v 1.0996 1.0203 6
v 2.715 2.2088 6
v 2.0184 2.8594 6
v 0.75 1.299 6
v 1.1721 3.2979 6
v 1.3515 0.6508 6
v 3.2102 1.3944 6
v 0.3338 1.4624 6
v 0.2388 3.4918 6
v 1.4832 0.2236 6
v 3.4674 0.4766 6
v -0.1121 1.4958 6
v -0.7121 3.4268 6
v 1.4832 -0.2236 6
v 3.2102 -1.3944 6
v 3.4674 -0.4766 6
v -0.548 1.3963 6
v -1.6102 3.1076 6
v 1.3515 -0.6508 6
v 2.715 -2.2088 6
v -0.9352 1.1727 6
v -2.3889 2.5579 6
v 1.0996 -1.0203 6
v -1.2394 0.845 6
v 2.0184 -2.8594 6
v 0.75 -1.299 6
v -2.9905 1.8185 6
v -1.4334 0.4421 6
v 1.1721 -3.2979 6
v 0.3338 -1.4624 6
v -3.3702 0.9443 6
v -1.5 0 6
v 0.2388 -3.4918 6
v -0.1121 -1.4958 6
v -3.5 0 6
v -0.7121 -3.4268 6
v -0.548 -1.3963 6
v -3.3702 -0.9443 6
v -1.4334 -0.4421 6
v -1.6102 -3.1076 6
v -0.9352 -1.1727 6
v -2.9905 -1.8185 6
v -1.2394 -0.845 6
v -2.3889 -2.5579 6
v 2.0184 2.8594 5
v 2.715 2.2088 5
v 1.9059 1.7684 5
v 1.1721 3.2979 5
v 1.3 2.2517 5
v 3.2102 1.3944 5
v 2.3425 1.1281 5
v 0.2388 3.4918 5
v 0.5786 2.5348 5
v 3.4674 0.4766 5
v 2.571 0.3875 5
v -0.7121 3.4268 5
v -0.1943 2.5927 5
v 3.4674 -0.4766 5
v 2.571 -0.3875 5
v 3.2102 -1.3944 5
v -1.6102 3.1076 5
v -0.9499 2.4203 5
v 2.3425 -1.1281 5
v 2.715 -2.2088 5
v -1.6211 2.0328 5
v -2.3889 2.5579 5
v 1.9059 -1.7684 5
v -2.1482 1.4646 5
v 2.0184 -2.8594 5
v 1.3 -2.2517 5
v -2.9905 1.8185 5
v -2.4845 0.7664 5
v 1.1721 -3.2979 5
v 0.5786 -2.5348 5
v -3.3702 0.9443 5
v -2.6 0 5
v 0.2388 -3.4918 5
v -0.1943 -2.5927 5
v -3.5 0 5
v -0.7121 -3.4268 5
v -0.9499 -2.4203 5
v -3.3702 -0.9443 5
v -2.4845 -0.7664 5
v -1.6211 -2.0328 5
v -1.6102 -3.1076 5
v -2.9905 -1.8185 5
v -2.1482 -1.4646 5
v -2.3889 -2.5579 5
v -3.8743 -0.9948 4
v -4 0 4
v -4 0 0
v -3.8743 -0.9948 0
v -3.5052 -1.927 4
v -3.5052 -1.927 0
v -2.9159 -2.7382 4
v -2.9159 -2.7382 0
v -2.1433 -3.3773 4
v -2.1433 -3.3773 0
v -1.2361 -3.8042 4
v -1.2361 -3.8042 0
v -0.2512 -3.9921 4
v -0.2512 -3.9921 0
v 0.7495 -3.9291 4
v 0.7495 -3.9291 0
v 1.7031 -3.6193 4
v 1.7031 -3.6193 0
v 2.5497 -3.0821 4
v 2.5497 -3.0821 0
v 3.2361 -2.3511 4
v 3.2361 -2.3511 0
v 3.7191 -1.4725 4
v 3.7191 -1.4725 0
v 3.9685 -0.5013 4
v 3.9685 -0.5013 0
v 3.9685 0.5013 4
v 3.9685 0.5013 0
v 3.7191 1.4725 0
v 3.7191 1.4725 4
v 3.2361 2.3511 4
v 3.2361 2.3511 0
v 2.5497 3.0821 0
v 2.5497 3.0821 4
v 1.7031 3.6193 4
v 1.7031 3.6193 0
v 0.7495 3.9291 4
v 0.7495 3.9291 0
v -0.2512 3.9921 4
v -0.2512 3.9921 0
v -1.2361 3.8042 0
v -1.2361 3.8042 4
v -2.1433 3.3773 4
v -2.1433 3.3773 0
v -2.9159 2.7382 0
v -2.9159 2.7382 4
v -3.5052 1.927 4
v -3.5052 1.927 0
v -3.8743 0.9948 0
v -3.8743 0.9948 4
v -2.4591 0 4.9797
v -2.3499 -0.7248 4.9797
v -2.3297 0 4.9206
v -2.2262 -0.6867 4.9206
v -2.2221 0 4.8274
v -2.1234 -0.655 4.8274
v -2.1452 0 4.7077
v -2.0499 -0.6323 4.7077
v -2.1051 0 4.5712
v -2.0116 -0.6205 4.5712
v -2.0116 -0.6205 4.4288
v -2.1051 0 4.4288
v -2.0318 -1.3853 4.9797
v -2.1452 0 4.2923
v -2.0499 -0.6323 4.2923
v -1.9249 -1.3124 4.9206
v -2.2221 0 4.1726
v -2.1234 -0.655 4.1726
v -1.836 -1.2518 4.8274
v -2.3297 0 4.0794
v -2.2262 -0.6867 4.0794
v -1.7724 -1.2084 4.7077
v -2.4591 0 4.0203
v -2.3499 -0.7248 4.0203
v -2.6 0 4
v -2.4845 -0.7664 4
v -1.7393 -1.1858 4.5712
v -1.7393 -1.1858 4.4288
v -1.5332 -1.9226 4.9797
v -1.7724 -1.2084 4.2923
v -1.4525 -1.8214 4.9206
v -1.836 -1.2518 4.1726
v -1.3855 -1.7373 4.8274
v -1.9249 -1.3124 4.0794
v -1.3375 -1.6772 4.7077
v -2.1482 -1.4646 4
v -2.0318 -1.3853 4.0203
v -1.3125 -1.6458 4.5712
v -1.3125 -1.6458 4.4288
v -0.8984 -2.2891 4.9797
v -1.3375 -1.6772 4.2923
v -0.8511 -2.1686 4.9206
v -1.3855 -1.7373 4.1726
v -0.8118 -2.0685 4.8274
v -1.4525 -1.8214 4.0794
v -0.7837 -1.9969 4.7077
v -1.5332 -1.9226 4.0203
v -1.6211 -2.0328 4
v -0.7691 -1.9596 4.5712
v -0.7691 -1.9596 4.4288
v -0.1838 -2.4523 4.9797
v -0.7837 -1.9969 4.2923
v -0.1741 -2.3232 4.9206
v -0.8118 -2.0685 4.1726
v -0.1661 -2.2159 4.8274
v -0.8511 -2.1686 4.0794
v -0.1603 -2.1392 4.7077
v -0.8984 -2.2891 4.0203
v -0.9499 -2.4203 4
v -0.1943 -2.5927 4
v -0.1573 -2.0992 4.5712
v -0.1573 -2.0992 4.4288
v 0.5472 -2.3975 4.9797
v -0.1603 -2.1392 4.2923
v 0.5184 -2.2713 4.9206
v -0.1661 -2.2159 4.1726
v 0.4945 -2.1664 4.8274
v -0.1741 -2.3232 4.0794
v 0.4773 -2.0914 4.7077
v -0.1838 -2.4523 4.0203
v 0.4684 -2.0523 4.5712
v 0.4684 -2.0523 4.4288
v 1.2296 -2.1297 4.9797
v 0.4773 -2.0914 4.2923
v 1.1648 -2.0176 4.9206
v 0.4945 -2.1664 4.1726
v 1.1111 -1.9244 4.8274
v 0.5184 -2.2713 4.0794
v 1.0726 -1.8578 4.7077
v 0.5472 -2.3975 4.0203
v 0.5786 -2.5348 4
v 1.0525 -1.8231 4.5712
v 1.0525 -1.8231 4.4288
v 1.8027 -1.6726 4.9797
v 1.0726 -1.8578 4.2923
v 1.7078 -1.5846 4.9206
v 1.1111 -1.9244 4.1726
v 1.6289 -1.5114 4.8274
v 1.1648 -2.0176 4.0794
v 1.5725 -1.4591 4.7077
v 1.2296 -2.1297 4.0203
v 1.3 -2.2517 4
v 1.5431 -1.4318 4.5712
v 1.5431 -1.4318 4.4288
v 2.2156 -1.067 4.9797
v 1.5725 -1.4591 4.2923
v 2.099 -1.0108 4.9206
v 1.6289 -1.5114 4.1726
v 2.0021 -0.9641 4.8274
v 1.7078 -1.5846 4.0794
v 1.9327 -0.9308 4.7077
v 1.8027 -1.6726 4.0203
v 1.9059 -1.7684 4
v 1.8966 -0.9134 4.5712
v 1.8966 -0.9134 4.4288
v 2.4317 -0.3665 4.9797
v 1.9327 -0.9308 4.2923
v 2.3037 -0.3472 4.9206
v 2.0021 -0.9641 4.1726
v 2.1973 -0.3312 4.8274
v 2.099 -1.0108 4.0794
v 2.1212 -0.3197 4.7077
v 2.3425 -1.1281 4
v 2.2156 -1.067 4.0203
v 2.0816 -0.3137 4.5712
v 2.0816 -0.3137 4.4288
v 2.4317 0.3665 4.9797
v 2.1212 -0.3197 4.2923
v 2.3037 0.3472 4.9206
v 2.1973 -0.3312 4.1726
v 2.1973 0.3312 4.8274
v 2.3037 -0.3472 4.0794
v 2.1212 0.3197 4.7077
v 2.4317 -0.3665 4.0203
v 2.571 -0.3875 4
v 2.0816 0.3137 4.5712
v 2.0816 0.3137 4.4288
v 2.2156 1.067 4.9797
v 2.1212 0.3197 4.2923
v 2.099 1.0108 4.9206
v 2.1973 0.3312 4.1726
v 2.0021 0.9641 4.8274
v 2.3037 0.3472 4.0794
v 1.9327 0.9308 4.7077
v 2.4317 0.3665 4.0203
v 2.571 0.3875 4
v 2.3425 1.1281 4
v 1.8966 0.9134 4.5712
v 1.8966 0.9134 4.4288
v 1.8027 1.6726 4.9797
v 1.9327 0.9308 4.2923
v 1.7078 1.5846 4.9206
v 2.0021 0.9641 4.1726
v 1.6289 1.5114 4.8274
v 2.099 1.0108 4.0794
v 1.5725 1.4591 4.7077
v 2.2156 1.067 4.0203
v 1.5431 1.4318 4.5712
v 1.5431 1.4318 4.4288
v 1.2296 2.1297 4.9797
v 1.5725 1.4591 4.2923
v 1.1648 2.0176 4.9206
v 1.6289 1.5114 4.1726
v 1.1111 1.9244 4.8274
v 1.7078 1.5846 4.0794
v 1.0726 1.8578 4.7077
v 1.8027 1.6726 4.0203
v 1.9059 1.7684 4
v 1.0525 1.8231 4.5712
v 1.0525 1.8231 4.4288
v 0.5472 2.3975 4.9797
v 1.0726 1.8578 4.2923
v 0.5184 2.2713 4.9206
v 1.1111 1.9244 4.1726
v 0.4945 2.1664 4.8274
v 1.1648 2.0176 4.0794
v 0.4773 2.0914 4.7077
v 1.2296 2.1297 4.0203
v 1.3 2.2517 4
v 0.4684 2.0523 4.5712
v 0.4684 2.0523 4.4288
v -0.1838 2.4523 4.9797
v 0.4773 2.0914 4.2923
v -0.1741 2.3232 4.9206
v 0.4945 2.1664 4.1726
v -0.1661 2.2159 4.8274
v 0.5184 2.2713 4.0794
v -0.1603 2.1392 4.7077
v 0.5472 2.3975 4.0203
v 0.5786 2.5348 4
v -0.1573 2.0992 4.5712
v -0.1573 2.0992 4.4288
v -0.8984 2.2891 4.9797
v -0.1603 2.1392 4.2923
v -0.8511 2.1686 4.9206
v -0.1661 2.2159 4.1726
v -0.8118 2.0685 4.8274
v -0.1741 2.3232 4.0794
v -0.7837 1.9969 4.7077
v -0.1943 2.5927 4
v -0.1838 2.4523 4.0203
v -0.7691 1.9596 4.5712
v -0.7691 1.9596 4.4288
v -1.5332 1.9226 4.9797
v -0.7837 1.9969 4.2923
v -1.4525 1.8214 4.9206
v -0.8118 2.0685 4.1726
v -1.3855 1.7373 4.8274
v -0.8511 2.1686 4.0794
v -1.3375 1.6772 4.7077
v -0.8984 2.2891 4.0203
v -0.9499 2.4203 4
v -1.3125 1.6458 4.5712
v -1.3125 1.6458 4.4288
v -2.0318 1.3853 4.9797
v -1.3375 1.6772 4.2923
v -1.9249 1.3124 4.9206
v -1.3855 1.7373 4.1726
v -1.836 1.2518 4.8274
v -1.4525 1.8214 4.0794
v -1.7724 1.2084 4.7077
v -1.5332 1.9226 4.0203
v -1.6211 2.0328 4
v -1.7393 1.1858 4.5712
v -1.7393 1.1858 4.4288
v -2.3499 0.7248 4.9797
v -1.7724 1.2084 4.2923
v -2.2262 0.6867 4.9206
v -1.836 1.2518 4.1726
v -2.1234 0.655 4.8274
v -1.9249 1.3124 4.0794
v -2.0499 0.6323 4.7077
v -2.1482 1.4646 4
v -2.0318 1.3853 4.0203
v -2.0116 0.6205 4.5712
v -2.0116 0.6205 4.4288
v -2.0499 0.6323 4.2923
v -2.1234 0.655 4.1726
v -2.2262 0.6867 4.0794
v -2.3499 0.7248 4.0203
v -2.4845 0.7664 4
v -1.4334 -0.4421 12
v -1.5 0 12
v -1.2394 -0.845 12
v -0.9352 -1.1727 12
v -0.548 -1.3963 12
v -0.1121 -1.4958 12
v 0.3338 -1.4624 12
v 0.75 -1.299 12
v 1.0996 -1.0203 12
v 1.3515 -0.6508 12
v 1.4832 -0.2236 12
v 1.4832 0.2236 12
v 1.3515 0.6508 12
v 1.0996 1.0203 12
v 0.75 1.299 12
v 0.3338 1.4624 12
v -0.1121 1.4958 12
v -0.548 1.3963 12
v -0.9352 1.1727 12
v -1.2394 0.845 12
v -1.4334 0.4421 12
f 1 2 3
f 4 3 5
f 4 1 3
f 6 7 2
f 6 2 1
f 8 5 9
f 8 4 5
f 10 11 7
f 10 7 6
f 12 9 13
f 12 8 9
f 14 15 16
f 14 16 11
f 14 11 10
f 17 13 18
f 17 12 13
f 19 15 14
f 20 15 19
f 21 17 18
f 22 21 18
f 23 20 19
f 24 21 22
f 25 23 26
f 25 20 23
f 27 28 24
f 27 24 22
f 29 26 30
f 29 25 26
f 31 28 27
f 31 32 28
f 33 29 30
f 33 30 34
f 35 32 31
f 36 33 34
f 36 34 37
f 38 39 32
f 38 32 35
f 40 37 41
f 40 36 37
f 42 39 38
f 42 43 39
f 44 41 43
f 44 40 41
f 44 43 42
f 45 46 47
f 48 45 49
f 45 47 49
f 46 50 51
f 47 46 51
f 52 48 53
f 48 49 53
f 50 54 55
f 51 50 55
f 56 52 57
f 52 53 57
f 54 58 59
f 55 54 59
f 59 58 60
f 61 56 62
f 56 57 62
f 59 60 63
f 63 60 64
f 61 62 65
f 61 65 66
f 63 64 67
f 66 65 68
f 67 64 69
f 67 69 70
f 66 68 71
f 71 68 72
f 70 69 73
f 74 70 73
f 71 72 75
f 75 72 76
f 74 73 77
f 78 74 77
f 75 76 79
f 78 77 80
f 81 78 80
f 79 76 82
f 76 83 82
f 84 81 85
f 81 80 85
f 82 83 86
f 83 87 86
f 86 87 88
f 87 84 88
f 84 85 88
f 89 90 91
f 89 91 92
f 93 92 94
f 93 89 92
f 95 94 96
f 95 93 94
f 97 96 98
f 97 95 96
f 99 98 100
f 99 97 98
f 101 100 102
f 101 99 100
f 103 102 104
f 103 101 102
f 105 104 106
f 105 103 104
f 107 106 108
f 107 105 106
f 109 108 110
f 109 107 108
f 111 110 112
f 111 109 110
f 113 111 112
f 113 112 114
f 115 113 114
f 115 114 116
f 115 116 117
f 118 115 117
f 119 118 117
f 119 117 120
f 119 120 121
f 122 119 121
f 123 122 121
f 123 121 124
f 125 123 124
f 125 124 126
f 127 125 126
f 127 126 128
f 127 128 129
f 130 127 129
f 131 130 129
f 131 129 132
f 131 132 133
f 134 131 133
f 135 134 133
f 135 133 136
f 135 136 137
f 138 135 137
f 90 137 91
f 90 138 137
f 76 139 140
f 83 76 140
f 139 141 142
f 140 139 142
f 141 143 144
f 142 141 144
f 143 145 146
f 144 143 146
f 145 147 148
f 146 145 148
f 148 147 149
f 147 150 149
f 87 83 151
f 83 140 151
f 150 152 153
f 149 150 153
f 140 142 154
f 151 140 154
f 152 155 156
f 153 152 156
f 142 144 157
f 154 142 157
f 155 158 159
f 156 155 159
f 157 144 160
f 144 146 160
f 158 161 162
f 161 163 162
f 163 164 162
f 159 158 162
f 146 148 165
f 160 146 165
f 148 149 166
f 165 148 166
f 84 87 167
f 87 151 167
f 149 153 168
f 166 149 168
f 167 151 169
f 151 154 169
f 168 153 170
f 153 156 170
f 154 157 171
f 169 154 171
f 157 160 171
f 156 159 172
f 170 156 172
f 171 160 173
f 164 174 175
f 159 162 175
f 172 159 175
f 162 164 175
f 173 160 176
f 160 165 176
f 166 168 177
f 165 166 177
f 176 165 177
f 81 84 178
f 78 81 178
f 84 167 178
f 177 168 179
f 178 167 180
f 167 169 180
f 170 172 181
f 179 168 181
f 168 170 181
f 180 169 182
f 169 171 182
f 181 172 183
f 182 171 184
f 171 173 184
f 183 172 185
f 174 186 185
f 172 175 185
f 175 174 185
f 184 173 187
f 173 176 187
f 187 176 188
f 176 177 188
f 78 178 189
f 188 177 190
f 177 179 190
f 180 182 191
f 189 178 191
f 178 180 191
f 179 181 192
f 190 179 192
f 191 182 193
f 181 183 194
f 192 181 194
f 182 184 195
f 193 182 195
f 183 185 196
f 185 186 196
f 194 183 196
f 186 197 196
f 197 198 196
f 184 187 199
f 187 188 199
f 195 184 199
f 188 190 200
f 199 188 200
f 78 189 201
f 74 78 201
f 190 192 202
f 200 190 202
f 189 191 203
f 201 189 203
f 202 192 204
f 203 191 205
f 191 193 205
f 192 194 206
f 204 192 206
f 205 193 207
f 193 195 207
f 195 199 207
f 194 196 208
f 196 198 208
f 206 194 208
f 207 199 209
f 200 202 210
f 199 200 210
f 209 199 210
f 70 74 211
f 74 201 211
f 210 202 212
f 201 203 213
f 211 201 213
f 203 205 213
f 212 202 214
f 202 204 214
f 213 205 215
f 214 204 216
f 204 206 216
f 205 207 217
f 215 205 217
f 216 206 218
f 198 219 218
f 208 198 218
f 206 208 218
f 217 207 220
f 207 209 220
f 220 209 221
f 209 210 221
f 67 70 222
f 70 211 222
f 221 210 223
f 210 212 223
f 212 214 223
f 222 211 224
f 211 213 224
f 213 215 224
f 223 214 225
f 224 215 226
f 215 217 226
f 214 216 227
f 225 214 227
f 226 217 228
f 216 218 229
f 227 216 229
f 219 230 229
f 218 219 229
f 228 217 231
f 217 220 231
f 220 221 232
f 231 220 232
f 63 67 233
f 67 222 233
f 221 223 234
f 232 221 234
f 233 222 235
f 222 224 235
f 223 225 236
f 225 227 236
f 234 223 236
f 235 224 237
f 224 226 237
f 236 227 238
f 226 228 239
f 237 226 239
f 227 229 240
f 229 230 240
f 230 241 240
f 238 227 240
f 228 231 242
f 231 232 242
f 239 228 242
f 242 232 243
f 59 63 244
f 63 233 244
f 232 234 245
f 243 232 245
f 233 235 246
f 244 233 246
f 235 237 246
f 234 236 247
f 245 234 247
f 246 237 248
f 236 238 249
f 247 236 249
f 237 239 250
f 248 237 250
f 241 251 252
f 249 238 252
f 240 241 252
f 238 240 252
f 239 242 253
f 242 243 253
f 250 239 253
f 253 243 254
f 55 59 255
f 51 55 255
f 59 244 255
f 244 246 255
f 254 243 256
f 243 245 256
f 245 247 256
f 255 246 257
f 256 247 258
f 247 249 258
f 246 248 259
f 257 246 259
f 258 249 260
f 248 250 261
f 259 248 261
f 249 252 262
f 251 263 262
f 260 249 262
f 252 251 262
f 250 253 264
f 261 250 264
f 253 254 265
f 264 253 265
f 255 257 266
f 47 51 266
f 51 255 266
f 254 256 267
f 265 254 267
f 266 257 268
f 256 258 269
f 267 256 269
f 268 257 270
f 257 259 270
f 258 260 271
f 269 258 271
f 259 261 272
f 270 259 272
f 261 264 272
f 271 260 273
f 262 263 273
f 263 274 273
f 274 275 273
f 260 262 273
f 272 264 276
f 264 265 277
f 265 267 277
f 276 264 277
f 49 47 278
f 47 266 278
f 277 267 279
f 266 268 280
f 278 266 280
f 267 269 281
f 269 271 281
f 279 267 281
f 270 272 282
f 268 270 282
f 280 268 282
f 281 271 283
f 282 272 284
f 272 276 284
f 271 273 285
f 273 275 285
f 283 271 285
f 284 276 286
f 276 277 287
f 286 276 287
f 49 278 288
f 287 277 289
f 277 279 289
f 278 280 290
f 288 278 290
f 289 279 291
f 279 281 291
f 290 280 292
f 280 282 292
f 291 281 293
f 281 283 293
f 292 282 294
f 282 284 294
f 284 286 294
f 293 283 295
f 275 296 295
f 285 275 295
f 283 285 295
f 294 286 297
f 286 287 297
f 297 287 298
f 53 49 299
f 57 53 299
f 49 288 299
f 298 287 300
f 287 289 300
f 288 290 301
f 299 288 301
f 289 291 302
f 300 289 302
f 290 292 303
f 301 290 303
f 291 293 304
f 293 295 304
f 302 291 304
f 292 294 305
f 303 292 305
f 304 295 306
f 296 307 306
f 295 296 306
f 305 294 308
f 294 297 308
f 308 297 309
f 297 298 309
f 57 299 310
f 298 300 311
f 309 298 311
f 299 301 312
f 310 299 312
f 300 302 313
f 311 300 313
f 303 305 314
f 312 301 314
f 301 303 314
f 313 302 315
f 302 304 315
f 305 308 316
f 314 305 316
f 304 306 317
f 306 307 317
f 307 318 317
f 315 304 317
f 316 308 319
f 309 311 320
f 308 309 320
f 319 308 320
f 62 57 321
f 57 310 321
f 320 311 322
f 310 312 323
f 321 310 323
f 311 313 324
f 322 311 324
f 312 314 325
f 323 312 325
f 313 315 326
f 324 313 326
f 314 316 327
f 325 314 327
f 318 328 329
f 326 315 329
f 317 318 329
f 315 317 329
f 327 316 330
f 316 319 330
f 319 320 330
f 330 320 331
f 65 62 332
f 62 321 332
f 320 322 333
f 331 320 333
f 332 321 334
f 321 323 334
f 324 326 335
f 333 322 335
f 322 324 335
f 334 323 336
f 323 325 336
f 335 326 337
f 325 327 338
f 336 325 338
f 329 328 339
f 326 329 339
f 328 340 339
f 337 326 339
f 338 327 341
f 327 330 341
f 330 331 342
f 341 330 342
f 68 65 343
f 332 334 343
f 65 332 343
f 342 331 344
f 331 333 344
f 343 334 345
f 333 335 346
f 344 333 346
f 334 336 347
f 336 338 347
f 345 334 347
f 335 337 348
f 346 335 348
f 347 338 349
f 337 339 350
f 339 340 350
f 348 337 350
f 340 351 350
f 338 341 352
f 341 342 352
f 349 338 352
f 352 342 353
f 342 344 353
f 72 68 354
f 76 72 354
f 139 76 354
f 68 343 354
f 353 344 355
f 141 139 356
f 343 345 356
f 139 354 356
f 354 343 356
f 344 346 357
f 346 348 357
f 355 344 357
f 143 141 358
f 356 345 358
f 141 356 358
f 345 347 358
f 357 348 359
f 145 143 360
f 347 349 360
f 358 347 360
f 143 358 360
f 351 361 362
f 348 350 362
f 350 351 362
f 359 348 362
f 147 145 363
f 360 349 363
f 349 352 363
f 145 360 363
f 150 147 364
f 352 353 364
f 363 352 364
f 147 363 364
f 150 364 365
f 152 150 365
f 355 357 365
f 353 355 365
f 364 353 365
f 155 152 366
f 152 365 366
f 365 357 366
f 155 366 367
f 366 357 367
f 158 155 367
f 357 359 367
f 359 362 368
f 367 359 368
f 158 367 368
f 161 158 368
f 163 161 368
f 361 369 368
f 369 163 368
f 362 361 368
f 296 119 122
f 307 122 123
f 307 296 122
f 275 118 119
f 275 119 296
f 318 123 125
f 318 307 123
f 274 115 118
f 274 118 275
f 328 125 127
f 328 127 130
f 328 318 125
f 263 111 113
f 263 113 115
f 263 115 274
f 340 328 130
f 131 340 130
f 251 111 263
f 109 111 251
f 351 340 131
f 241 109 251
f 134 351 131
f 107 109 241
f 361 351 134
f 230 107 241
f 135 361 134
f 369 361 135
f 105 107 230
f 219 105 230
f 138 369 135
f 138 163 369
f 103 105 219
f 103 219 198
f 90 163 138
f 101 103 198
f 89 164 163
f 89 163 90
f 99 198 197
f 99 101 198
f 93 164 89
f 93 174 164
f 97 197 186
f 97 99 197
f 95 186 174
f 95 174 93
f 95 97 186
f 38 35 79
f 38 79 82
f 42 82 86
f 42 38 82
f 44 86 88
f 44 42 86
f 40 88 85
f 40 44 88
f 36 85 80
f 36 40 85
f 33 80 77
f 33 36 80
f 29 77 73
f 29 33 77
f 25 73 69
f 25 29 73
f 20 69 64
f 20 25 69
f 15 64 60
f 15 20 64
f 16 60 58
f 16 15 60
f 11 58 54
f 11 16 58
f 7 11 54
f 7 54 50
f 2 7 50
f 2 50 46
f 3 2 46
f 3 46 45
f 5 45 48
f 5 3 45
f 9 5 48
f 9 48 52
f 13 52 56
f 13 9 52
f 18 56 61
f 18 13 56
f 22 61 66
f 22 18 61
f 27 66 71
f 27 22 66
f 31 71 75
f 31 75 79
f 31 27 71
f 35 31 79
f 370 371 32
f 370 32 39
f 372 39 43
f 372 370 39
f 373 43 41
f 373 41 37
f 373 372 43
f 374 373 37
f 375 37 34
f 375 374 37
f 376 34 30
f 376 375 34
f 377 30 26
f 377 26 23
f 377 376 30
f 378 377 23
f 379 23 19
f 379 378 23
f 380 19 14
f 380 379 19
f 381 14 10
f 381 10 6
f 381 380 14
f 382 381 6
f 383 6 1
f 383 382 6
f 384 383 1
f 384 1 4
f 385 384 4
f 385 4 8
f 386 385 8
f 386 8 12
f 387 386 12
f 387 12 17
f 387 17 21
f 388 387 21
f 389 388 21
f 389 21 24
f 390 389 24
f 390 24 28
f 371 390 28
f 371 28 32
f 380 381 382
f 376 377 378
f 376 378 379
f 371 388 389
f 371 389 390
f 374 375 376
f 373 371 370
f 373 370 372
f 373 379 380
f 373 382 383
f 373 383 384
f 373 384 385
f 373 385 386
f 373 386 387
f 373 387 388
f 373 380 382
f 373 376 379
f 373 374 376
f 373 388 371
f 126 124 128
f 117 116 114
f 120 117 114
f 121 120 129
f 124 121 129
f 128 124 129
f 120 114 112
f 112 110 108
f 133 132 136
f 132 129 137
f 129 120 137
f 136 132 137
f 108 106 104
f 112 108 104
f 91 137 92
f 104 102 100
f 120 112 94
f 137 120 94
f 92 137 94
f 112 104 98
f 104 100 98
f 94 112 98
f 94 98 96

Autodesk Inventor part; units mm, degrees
ref_plane "YZ Plane" through (0, 0, 0) normal (1, 0, 0) x (0, 1, 0)
ref_plane "XZ Plane" through (0, 0, 0) normal (0, 1, 0) x (-1, 0, 0)
ref_plane "XY Plane" through (0, 0, 0) normal (0, 0, 1) x (1, 0, 0)
sketch "スケッチ1" plane through (0, 0, 0) normal (0, 1, 0) x (-1, 0, 0)
  line L0 (0, 0) -> (0, 12)
  line L1 (0, 0) -> (4, 0)
  line L2 (4, 0) -> (4, 4)
  line L3 (4, 4) -> (2.6, 4)
  line L4 (2.6, 4) -> (2.6, 5) construction
  line L5 (2.6, 5) -> (3.5, 5)
  line L6 (3.5, 5) -> (3.5, 6)
  line L7 (3.5, 6) -> (1.5, 6)
  line L8 (1.5, 6) -> (1.5, 12)
  line L9 (1.5, 12) -> (0, 12)
  arc A0 (2.6, 5) -> (2.6, 4) centre (2.6, 4.5) ccw
  line L10 (2.6, 4.5) -> (2.1, 4.5) construction
  dimension "d4" = 1
  dimension "d5" = 6
  dimension "d7" = 4
  dimension "d8" = 6
  dimension "d11" = 2.1
  dimension "d12" = 3
  dimension "d13" = 8
  dimension "d14" = 7
revolve "回転1" add sketch "スケッチ1" angle 360 about axis through (0, 0, 0) along (0, 0, 1)
thread "ねじ1" size "M3x0.5" class "6g" standard "ANSI Metric M Profile" full length
properties part number "SPNFL-BRN-M3-6" material "ステンレス鋼 AISI 304"
